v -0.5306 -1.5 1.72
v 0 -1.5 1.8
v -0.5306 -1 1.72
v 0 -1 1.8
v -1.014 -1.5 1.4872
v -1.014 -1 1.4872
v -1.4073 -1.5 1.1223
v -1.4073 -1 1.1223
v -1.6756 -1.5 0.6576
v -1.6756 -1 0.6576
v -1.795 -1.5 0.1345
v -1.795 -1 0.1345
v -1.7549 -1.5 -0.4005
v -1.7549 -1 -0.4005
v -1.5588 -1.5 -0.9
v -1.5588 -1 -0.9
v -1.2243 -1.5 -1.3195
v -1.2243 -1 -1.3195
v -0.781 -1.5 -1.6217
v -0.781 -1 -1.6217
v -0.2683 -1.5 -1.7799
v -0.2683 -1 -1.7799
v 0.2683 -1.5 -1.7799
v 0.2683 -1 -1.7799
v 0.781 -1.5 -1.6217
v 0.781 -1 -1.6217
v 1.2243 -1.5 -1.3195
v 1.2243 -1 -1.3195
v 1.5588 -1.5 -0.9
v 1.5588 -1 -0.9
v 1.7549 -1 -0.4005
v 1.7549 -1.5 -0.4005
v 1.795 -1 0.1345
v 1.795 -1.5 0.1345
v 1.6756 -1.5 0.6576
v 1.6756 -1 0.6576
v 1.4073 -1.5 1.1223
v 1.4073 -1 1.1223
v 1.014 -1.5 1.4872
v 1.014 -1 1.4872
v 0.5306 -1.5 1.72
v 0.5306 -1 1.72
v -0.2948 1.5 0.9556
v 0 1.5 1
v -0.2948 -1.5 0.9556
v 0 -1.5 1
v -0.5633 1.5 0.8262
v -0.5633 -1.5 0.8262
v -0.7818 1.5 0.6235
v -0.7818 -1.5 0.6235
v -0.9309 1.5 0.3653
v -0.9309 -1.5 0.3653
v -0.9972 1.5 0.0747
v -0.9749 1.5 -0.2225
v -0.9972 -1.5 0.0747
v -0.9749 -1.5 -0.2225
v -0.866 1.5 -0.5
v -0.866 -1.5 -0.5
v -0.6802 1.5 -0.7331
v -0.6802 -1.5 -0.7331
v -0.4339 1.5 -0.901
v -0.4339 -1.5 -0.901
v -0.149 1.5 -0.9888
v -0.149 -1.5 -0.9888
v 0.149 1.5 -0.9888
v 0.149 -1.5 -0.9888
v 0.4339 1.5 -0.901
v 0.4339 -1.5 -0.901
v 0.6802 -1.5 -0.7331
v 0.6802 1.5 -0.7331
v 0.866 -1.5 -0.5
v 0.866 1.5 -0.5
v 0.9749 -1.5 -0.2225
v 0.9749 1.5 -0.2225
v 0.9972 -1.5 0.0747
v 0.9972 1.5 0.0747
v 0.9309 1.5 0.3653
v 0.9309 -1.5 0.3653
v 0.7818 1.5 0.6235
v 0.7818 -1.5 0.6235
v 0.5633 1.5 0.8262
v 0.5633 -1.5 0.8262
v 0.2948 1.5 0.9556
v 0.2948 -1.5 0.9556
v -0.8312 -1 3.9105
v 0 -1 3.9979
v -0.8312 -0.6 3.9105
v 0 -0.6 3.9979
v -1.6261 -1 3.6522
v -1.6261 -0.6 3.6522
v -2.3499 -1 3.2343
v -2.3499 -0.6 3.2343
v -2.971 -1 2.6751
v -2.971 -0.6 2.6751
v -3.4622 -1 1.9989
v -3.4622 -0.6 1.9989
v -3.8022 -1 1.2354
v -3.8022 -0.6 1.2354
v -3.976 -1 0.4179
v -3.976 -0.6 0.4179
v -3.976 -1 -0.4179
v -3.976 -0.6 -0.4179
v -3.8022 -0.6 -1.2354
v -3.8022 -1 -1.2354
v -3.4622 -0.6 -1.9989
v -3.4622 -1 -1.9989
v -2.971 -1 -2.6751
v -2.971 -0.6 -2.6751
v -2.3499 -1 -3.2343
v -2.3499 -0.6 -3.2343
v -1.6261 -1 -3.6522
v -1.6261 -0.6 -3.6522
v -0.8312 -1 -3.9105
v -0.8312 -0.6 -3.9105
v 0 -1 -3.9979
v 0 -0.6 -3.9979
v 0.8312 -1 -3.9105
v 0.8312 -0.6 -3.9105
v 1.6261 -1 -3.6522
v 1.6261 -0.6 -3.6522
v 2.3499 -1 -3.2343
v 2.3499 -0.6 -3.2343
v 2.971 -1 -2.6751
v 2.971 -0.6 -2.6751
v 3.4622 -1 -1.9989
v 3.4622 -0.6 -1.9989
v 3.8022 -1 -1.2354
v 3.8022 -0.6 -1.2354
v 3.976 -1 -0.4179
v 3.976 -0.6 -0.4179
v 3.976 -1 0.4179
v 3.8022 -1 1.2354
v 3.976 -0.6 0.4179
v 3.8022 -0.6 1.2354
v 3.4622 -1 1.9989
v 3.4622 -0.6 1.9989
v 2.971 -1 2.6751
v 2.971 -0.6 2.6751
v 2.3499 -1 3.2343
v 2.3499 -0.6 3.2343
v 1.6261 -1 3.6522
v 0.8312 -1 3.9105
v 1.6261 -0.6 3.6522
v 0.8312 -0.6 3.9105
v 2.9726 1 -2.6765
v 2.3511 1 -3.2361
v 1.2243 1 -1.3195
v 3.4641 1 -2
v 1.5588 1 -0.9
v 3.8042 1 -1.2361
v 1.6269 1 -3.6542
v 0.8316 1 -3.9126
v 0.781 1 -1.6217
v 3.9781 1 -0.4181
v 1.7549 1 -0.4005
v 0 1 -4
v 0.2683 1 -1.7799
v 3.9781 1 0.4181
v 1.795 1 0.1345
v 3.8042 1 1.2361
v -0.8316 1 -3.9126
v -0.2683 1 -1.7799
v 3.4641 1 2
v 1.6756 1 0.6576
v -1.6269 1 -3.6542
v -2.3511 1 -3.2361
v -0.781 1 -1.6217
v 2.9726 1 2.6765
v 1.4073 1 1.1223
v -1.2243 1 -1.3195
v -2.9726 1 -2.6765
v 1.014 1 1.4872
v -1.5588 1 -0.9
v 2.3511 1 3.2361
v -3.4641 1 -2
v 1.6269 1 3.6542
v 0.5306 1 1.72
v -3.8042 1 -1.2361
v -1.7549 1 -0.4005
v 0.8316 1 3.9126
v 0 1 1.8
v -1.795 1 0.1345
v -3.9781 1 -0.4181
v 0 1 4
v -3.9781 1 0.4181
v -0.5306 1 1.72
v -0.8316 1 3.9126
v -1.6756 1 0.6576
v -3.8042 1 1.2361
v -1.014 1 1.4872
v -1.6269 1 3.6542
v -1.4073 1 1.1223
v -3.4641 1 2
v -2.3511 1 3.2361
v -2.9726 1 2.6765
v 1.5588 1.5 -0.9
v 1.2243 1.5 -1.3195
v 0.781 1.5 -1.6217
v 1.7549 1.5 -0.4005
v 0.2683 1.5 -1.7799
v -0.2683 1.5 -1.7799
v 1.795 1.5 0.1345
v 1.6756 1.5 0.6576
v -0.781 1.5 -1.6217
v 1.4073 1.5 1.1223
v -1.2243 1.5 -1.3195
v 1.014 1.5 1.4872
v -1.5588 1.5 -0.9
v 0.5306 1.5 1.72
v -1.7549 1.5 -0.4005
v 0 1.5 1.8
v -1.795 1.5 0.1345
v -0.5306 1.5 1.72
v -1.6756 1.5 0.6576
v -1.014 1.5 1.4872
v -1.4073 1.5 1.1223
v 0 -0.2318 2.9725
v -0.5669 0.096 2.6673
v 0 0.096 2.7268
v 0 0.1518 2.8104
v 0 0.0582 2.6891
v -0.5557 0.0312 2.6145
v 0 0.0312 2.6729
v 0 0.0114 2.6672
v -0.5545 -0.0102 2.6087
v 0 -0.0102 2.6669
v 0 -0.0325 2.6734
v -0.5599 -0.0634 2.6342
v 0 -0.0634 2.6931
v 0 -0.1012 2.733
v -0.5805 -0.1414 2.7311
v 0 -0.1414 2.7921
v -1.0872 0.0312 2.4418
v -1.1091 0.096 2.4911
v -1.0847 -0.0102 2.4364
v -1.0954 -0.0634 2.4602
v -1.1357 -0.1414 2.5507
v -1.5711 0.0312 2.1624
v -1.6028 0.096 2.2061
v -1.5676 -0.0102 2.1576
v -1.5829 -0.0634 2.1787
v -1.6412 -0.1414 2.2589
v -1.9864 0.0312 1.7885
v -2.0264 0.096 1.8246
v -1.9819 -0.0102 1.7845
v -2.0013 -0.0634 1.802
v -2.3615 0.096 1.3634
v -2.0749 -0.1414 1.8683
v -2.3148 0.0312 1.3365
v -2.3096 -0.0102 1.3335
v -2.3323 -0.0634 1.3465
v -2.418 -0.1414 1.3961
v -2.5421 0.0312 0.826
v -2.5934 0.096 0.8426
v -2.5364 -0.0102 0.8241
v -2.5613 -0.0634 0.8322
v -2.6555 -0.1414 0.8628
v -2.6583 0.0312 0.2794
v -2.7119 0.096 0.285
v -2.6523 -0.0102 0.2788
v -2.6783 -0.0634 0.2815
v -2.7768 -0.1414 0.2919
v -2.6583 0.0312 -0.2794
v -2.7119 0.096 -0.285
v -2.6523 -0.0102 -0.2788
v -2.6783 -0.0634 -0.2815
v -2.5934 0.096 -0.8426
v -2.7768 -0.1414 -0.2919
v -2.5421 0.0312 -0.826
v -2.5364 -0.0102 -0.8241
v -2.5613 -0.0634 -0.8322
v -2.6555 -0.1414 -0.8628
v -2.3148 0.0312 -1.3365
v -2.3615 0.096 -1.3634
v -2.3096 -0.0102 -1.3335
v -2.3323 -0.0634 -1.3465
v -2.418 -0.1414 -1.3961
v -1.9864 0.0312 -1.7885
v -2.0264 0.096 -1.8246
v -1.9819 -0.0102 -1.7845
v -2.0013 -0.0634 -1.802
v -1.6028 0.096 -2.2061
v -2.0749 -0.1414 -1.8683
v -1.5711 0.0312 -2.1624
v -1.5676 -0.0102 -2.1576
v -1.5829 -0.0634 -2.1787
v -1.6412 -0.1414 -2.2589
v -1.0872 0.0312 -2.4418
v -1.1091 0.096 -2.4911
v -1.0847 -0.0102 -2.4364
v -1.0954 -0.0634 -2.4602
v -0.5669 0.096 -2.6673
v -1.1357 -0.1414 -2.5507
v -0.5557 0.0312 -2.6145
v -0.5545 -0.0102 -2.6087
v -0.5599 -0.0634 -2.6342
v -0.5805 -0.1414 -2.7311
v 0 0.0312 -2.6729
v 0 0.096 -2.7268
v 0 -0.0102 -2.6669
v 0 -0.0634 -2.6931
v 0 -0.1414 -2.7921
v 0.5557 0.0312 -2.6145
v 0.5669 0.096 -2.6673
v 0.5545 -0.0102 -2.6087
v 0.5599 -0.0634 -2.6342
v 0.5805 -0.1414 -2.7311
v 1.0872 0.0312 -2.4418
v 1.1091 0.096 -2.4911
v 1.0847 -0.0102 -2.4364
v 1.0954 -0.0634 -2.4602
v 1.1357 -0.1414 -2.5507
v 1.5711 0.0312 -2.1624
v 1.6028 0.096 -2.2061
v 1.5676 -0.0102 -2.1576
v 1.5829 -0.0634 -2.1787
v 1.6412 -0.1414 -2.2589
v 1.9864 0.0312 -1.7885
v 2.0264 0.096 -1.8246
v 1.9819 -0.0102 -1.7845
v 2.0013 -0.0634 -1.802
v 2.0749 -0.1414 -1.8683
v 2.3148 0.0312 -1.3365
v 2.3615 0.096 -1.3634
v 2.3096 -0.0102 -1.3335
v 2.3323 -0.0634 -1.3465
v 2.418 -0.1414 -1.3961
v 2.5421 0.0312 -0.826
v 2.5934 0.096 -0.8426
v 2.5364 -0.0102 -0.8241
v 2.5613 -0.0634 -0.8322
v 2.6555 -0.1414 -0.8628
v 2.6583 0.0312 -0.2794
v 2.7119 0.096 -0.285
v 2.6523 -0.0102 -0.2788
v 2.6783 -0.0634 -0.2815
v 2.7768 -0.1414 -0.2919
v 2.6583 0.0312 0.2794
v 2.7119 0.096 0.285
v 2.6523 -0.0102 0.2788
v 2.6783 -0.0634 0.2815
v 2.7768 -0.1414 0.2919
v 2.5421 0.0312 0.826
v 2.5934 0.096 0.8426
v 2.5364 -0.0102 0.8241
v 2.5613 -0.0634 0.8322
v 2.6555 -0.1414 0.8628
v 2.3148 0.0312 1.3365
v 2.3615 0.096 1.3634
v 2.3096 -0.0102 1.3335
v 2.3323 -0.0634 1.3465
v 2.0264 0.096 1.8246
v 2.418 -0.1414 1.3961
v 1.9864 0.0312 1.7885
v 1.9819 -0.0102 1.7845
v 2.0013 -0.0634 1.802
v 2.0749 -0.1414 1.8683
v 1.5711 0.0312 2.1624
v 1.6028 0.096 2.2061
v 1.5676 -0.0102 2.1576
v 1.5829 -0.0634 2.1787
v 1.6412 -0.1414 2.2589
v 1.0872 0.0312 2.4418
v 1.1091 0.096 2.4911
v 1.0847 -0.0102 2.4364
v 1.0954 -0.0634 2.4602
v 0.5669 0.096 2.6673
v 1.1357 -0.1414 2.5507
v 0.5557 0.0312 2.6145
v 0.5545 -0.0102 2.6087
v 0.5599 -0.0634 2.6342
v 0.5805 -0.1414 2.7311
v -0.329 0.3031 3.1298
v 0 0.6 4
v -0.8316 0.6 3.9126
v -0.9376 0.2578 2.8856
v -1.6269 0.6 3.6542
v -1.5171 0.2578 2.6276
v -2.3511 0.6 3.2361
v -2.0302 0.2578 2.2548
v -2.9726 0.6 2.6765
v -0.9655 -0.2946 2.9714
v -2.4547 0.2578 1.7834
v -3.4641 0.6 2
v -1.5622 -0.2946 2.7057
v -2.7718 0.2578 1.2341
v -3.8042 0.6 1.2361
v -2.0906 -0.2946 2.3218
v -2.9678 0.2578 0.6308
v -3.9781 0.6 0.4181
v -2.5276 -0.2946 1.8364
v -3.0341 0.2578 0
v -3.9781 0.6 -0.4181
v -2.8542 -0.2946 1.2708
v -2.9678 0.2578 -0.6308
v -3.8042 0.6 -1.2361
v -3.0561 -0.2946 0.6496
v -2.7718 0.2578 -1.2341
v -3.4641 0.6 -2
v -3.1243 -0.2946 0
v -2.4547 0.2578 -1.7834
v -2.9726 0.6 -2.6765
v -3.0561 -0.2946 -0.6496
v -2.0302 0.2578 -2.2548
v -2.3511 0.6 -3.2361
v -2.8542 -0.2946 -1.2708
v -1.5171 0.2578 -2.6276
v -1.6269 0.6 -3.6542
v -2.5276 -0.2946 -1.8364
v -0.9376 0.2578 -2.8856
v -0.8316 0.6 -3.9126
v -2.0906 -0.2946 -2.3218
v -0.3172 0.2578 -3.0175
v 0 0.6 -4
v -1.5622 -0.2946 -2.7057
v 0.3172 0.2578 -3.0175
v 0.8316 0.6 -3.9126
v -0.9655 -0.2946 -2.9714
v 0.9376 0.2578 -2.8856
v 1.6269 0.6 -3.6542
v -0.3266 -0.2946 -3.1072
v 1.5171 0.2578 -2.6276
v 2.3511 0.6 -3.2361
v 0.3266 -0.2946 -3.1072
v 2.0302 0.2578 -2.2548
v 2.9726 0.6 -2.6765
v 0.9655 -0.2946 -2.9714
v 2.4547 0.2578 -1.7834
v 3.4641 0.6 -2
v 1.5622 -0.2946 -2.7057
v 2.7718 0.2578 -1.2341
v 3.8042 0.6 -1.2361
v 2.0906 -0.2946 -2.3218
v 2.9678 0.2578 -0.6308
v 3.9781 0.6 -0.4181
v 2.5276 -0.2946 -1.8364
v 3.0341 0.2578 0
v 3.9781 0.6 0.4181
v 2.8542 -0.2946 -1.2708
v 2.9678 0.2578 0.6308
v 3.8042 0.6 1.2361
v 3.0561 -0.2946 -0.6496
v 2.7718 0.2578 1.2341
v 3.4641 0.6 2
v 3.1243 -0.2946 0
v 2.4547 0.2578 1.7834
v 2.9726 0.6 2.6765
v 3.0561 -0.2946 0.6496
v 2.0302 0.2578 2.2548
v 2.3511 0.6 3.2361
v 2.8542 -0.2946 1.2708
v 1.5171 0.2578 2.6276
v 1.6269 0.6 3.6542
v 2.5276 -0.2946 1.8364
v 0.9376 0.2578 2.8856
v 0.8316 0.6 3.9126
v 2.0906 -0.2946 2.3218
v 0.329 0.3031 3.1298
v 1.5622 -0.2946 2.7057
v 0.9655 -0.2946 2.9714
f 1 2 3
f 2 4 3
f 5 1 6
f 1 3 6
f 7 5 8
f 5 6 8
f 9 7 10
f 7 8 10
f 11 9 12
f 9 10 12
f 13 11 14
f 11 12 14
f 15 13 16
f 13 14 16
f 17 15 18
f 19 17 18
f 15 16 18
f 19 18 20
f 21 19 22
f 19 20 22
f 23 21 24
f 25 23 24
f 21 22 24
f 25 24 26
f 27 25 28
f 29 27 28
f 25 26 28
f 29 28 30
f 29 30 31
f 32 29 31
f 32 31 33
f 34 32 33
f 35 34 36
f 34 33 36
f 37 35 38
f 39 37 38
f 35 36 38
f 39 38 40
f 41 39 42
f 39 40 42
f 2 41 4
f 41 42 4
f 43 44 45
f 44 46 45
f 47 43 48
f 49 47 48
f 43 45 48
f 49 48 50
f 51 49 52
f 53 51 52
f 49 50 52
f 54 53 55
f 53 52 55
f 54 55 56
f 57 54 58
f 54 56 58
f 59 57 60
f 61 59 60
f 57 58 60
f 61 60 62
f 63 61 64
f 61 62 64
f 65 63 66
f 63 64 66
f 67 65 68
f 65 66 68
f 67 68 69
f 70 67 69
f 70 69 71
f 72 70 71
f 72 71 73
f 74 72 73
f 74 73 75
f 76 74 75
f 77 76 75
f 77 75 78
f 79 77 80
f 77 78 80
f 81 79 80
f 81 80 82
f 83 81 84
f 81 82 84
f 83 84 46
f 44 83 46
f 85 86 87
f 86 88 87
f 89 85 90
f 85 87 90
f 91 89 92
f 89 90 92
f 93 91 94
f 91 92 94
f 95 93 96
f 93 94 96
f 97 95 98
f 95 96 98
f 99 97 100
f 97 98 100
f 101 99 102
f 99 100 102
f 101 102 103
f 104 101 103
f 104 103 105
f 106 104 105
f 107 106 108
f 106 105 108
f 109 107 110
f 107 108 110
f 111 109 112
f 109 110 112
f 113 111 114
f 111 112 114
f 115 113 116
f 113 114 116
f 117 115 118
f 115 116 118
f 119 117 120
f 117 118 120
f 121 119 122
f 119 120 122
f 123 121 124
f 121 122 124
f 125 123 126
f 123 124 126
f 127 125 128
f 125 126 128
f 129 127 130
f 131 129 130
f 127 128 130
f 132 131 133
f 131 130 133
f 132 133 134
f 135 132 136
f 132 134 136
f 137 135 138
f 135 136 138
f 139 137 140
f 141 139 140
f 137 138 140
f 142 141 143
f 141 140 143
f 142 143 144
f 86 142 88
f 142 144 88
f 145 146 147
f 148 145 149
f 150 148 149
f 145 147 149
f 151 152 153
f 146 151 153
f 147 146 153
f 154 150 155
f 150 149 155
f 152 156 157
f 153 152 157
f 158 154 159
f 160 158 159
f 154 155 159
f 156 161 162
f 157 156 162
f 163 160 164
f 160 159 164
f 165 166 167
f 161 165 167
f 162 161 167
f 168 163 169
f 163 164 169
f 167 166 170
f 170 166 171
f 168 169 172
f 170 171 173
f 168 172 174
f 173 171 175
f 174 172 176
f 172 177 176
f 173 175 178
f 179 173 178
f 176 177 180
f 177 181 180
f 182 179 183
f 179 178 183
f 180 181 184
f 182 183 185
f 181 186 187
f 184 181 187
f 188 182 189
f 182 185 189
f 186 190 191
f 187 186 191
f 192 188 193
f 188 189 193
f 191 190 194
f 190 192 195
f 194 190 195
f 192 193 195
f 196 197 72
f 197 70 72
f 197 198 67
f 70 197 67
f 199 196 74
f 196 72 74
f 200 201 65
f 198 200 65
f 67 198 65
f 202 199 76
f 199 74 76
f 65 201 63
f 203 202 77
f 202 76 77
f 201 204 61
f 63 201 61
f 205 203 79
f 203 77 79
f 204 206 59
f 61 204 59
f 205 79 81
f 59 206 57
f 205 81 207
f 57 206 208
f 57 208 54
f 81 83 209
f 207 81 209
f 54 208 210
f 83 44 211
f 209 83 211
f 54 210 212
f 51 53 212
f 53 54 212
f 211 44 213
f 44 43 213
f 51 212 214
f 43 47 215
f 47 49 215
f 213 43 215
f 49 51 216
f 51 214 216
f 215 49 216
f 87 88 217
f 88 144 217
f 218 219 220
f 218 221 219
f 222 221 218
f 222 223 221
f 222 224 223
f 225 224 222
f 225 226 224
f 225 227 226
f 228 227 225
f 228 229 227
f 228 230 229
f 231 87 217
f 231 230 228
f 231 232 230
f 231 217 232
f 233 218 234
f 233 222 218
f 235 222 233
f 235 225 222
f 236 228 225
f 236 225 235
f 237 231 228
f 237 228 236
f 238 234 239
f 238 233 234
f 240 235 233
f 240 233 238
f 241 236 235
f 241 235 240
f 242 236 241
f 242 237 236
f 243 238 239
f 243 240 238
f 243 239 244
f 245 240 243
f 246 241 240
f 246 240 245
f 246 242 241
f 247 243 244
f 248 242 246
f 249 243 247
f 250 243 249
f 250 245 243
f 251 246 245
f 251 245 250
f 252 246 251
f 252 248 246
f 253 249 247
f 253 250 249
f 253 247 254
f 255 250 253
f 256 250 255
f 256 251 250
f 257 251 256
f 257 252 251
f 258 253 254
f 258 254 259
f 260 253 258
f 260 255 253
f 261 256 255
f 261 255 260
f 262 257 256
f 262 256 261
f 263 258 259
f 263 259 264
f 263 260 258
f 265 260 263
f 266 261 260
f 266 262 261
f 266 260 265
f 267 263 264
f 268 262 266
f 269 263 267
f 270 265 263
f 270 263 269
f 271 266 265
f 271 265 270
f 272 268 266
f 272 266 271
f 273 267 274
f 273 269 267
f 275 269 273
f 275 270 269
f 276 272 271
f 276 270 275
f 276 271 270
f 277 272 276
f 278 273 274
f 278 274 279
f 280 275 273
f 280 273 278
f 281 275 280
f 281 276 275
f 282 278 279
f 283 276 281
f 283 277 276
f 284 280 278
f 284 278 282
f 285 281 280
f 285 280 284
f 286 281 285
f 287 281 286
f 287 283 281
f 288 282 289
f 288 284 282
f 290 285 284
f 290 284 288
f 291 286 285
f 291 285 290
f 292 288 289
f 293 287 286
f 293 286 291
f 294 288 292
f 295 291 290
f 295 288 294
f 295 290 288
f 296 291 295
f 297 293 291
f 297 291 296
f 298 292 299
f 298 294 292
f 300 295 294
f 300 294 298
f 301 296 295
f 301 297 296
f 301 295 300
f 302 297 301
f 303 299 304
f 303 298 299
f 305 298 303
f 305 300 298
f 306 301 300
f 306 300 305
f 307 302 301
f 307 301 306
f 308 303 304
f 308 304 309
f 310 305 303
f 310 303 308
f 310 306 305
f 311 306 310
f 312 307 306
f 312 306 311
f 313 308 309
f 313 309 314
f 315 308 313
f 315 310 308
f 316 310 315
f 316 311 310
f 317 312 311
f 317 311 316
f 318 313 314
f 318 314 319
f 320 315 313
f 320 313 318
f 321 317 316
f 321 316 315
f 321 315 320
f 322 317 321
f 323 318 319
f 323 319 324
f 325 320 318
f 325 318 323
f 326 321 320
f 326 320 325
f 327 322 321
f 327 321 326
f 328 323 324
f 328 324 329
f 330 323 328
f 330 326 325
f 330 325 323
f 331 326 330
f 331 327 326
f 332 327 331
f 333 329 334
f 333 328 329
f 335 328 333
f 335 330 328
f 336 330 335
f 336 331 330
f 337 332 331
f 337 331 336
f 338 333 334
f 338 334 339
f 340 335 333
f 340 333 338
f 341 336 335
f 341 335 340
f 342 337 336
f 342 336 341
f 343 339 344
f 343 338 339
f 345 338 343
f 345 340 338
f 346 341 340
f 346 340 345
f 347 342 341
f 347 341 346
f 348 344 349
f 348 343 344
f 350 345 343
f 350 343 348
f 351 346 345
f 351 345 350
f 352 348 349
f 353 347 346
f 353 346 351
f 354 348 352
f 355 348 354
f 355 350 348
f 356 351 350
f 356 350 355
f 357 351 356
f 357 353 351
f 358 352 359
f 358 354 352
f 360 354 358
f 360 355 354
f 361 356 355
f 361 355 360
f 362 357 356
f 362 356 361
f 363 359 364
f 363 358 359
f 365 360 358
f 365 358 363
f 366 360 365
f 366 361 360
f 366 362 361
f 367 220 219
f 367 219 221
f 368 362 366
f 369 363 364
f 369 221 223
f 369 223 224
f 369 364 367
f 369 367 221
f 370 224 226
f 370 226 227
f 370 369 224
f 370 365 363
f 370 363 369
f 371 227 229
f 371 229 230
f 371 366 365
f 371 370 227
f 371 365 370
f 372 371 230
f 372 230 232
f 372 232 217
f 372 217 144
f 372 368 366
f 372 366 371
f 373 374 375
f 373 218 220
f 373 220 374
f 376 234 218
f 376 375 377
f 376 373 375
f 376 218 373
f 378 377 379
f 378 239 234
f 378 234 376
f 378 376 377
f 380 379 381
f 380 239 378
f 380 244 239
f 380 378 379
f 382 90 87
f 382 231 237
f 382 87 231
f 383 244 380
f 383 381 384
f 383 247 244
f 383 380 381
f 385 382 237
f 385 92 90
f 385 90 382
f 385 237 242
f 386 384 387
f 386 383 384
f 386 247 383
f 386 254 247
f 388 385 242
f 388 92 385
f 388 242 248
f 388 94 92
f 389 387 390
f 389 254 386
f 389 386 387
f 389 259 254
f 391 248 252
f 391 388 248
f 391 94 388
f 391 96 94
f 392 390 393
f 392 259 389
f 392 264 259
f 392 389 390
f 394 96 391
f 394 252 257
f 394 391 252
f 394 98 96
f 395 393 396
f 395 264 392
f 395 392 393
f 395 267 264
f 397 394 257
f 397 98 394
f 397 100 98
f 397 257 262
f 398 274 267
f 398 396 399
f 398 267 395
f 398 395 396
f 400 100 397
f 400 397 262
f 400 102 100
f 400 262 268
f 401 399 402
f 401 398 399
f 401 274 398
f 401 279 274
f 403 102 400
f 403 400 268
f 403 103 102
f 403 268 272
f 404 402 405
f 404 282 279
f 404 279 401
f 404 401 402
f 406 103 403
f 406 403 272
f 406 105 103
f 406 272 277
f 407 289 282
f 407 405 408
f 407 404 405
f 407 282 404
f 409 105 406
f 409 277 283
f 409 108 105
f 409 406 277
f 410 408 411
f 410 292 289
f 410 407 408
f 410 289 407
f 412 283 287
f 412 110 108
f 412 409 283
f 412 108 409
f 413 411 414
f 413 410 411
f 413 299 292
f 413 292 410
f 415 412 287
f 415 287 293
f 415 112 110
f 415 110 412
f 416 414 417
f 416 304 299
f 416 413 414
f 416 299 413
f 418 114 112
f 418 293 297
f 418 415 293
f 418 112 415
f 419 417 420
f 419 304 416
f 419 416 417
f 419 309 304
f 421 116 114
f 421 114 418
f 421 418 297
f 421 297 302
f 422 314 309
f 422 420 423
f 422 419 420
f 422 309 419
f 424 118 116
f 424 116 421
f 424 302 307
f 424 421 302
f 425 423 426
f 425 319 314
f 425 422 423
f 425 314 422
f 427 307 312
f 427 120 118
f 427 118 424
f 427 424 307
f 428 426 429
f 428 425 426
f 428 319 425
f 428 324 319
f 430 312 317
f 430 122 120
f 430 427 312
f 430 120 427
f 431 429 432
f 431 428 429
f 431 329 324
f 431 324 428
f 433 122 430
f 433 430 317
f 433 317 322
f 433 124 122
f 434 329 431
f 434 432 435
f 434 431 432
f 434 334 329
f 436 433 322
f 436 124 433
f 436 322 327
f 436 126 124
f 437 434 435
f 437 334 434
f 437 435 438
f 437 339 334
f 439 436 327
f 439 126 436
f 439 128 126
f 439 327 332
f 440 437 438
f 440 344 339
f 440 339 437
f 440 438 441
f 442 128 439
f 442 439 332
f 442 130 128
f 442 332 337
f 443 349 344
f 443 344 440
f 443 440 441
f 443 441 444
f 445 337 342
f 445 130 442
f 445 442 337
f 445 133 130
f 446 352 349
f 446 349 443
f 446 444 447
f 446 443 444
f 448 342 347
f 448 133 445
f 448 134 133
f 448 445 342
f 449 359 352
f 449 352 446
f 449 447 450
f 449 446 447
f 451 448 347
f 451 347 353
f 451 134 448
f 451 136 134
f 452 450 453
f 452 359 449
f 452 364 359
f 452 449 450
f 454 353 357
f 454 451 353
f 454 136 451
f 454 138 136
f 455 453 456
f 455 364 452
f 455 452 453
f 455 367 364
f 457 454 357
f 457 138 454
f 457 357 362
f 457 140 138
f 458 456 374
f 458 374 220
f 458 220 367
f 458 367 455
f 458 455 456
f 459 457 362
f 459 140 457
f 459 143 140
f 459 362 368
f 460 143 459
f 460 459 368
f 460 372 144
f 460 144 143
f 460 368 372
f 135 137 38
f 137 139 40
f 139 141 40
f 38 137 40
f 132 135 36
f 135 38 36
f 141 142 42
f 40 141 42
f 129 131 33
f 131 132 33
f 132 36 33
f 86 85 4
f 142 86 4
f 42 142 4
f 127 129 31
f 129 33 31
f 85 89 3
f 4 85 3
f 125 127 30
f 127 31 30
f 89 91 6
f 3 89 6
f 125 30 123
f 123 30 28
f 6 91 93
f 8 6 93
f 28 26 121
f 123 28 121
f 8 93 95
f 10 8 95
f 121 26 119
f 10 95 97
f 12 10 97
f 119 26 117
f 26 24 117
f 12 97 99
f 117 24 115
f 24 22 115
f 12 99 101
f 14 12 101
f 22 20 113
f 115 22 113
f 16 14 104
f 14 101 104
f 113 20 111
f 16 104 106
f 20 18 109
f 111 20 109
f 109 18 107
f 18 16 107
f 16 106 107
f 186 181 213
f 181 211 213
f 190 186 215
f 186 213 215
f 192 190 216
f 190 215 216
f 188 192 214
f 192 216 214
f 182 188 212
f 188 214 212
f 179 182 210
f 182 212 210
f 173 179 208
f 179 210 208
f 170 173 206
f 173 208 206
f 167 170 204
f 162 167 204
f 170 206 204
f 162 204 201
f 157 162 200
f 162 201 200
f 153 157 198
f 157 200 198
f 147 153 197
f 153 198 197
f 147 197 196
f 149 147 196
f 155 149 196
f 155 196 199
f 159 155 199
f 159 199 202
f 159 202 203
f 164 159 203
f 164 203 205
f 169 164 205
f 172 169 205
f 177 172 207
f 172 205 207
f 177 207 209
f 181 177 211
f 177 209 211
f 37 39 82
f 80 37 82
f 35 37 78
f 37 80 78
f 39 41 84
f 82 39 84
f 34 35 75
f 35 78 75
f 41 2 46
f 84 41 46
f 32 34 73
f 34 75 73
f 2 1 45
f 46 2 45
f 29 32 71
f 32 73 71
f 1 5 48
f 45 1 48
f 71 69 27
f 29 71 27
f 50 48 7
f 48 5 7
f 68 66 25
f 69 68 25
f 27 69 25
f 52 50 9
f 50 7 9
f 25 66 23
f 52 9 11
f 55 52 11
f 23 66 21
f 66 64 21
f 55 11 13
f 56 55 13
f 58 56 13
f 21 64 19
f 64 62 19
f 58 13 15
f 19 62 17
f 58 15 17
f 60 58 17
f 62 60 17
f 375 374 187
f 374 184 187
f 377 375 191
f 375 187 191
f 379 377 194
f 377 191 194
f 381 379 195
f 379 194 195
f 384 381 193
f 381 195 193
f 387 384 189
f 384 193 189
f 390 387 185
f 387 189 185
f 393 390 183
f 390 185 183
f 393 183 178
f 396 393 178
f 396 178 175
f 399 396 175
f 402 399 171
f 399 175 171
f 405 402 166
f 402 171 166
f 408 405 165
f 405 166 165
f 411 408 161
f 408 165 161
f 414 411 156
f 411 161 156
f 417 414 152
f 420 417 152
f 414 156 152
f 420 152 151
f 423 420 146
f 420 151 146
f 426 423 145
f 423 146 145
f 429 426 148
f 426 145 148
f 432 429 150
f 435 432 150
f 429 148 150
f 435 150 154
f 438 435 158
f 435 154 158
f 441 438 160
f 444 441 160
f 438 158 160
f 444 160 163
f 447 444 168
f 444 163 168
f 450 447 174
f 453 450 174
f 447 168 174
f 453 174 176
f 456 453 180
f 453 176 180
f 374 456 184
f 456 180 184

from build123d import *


with BuildPart() as part:
    # 草图1 → 旋转9 (revolve)
    with BuildSketch(Plane.XY, mode=Mode.PRIVATE) as revolve_9_sk:
        with BuildLine():
            Line((1, -1.5), (1.8, -1.5))
            Line((1.8, -1.5), (1.8, -1))
            Line((1.8, -1), (3.997858661, -1))
            Line((3.997858661, -1), (3.997858661, -0.6))
            add(Edge.make_bspline(
                [(4, 0.6), (2.168643652, 0), (3.997858661, -0.6)],
                knots=[0, 0, 0, 1, 1, 1], degree=2, weights=[1, 2.678143978, 1]))
            Line((4, 0.6), (4, 1))
            Line((4, 1), (1.8, 1))
            Line((1.8, 1), (1.8, 1.5))
            Line((1.8, 1.5), (1, 1.5))
            Line((1, 1.5), (1, -1.5))
        make_face()
    revolve(revolve_9_sk.sketch.rotate(Axis((0, 2.07863921, 0), (0, -1, 0)), 90), axis=Axis((0, 2.07863921, 0), (0, -1, 0)))


solid = part.part
